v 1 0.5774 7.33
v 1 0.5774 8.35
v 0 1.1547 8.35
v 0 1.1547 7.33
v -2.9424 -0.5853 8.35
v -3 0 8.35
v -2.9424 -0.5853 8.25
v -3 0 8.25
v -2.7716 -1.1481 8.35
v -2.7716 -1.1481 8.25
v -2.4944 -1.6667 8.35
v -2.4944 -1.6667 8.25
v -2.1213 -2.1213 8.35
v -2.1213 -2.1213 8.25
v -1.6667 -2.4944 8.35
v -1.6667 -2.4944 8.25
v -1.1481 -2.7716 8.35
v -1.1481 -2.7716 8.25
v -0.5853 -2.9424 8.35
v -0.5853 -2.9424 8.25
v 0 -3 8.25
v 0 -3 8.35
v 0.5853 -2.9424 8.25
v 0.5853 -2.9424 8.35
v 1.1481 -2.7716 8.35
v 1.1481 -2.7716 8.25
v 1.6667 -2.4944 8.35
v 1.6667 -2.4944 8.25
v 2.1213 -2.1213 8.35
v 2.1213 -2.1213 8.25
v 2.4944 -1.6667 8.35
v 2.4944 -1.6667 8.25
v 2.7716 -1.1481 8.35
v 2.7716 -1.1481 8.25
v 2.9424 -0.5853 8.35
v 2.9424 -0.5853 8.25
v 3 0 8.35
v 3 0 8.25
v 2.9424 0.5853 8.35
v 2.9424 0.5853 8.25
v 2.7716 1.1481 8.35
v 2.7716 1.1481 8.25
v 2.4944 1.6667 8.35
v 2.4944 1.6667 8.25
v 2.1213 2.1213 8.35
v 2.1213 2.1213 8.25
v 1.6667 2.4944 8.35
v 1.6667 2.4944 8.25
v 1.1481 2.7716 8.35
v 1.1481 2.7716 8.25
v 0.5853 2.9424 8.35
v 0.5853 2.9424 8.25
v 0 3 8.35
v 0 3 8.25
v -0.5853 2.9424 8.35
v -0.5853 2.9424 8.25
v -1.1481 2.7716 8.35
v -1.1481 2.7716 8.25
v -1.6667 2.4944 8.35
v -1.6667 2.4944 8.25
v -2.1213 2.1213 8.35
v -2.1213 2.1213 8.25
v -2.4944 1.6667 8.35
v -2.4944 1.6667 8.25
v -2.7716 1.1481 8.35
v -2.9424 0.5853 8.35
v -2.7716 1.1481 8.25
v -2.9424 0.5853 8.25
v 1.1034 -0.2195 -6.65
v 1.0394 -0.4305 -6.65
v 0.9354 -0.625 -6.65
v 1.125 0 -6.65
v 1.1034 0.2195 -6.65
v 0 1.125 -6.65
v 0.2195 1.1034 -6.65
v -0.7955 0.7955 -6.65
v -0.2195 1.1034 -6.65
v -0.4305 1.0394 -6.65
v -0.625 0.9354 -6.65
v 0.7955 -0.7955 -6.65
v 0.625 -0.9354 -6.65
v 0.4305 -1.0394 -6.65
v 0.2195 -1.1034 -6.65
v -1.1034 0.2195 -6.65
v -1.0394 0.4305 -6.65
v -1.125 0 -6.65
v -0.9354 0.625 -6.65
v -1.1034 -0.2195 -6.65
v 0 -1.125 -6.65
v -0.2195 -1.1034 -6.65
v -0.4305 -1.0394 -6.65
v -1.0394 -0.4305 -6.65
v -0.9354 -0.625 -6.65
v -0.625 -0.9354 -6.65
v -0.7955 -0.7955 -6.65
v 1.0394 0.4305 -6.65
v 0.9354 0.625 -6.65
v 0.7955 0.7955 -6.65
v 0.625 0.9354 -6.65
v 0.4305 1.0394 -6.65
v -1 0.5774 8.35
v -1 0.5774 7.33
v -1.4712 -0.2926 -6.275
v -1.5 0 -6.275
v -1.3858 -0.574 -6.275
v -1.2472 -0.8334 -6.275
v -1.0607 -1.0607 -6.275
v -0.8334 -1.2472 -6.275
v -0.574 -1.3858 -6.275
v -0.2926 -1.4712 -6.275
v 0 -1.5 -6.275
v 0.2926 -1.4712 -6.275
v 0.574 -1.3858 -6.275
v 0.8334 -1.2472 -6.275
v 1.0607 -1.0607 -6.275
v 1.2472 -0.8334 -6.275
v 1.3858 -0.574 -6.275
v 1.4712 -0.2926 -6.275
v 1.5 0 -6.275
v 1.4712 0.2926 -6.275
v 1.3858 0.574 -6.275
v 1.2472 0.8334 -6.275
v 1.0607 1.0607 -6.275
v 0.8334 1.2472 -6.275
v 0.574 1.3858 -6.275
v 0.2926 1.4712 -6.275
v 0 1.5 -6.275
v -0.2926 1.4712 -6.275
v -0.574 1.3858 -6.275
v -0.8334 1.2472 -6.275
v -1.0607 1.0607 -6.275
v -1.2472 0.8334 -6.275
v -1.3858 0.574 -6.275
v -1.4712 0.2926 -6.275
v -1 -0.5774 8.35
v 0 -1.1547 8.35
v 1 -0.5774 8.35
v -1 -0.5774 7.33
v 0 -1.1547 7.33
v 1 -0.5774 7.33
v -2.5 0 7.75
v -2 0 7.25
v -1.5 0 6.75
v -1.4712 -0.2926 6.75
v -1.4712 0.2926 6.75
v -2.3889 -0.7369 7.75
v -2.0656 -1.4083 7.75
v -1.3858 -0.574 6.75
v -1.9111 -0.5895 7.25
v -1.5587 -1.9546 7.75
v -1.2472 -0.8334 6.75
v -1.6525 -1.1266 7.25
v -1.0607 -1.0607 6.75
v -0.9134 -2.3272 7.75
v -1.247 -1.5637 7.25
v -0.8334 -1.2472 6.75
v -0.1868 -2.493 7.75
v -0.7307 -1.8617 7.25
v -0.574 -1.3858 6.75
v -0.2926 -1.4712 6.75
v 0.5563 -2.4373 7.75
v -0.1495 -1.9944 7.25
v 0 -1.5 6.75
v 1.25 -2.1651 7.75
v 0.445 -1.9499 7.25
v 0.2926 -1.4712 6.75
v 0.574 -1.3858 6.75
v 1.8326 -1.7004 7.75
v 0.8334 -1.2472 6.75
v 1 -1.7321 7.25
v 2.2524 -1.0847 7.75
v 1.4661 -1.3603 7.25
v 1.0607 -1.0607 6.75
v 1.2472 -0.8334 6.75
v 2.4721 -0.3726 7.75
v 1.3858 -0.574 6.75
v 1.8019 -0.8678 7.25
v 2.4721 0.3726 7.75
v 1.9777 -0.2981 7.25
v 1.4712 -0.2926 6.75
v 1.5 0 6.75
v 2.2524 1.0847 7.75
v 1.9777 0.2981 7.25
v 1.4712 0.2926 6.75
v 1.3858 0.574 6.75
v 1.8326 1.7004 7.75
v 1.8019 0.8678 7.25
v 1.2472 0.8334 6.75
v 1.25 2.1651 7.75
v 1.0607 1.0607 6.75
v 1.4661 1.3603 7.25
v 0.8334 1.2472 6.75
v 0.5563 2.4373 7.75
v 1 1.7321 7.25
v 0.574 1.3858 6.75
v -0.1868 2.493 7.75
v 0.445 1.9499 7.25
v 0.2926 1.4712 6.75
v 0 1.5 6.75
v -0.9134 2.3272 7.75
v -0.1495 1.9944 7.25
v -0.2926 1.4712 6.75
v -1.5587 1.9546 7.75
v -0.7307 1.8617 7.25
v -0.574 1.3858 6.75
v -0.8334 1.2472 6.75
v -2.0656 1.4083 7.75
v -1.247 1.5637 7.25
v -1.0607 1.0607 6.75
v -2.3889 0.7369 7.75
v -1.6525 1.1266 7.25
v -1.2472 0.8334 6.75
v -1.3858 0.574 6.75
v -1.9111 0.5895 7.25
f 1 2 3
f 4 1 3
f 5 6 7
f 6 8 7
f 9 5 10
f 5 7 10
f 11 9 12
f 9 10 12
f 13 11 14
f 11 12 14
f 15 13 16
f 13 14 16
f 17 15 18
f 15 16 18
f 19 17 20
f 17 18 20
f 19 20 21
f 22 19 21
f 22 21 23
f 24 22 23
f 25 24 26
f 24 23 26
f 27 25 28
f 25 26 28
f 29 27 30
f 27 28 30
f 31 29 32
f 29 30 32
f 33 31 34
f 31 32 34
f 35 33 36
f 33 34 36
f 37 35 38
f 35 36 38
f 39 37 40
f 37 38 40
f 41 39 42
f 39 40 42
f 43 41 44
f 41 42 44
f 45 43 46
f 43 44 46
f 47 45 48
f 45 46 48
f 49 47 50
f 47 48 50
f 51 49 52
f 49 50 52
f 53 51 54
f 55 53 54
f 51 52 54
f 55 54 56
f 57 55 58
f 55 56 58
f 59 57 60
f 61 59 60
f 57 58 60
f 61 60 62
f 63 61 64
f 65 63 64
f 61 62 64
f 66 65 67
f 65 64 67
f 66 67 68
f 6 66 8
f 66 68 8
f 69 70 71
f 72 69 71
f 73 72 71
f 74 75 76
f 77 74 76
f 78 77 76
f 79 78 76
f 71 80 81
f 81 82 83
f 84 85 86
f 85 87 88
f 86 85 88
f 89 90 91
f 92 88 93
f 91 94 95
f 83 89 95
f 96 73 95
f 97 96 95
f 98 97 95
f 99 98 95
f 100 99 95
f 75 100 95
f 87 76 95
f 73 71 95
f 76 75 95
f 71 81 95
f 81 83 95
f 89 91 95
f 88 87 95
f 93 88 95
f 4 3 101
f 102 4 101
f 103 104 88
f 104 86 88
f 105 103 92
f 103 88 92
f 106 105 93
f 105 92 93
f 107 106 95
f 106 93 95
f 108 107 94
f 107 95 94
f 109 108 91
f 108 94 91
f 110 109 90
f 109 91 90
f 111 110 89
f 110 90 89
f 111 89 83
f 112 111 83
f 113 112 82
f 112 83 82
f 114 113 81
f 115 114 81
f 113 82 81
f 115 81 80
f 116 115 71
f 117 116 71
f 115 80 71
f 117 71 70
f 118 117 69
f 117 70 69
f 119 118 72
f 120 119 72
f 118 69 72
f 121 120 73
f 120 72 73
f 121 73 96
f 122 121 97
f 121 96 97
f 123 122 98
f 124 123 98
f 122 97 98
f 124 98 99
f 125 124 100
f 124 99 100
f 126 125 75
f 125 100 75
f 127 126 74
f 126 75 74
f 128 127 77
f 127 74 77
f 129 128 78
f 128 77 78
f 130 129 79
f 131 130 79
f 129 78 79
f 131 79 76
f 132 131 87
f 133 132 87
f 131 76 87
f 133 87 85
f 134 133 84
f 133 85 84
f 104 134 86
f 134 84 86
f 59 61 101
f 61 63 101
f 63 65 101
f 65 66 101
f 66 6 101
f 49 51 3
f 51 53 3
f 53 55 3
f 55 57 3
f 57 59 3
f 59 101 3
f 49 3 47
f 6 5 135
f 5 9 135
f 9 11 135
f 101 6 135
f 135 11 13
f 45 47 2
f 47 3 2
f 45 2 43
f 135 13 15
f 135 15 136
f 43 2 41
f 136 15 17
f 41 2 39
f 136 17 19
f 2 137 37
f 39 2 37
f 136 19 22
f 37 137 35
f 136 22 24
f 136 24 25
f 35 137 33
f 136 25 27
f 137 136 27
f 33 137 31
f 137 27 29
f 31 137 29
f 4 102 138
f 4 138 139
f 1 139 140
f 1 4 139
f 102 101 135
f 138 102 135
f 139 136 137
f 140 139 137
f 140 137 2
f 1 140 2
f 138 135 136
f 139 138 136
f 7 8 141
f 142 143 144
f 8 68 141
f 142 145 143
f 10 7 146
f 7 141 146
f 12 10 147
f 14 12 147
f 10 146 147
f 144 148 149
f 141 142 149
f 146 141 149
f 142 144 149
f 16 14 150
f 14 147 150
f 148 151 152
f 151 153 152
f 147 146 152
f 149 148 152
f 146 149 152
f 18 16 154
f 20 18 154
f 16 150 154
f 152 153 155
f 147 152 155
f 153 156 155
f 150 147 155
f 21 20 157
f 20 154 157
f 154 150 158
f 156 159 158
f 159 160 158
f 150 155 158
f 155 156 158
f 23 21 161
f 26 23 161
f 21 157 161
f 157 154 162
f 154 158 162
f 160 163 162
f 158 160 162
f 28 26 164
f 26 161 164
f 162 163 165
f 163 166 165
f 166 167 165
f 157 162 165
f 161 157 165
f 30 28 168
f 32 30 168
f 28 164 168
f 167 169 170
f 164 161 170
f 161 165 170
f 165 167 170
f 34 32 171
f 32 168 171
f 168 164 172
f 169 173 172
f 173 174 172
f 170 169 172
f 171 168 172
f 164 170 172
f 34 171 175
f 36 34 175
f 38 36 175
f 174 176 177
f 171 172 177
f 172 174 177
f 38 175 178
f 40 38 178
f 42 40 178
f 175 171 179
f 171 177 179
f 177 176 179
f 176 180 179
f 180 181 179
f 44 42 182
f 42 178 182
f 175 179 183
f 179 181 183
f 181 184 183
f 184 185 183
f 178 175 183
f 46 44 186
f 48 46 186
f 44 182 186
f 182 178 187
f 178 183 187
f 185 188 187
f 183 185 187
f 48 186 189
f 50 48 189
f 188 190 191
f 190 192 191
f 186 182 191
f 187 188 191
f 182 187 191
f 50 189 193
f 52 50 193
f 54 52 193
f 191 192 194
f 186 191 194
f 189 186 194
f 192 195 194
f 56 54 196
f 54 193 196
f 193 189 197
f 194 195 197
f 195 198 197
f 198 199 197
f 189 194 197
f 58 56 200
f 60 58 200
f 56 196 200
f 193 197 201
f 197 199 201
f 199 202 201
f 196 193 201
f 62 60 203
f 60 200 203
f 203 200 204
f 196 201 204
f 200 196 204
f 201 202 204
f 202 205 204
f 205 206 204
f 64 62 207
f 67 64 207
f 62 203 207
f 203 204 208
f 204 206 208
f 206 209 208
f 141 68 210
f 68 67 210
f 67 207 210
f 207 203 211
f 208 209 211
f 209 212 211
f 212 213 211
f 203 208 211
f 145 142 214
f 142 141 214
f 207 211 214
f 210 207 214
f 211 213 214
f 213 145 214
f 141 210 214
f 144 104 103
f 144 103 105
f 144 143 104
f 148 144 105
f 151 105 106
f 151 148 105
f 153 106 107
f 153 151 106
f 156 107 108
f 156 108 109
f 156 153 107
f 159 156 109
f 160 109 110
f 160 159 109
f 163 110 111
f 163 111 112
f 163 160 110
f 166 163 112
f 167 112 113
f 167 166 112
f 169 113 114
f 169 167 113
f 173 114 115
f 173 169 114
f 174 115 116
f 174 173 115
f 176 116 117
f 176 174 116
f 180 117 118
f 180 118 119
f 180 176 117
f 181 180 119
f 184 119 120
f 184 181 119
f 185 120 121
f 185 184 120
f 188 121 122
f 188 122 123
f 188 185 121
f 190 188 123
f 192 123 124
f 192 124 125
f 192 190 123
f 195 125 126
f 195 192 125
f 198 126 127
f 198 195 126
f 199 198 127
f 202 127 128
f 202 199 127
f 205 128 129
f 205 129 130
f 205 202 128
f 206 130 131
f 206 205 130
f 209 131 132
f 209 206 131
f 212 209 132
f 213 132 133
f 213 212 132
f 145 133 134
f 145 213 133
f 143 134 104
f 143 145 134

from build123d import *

# Parameters (mm, degrees)
CUT_EXTRUDE2_DEPTH = 1.02


with BuildPart() as part:
    # Sketch14 → Revolve1 (revolve)
    with BuildSketch(Plane(origin=(0, 0, 0), x_dir=(0, 0, -1), z_dir=(1, 0, 0)), mode=Mode.PRIVATE) as revolve1_sk:
        Polygon((-8.35, 0), (-8.35, 3), (-8.25, 3), (-6.75, 1.5), (-6.65, 1.5), (6.275, 1.5), (6.65, 1.125), (6.65, 0), align=None)
    revolve(revolve1_sk.sketch.rotate(Axis((0, 0, -6.65), (0, 0, 1)), 90), axis=Axis((0, 0, -6.65), (0, 0, 1)))

    # Sketch5 → Cut-Extrude2 (cut)
    with BuildSketch(Plane.XY.offset(8.35)):
        Polygon((0, -1.154700538), (1, -0.577350269), (1, 0.577350269), (0, 1.154700538), (-1, 0.577350269), (-1, -0.577350269), align=None)
    extrude(amount=-CUT_EXTRUDE2_DEPTH, mode=Mode.SUBTRACT)


solid = part.part
